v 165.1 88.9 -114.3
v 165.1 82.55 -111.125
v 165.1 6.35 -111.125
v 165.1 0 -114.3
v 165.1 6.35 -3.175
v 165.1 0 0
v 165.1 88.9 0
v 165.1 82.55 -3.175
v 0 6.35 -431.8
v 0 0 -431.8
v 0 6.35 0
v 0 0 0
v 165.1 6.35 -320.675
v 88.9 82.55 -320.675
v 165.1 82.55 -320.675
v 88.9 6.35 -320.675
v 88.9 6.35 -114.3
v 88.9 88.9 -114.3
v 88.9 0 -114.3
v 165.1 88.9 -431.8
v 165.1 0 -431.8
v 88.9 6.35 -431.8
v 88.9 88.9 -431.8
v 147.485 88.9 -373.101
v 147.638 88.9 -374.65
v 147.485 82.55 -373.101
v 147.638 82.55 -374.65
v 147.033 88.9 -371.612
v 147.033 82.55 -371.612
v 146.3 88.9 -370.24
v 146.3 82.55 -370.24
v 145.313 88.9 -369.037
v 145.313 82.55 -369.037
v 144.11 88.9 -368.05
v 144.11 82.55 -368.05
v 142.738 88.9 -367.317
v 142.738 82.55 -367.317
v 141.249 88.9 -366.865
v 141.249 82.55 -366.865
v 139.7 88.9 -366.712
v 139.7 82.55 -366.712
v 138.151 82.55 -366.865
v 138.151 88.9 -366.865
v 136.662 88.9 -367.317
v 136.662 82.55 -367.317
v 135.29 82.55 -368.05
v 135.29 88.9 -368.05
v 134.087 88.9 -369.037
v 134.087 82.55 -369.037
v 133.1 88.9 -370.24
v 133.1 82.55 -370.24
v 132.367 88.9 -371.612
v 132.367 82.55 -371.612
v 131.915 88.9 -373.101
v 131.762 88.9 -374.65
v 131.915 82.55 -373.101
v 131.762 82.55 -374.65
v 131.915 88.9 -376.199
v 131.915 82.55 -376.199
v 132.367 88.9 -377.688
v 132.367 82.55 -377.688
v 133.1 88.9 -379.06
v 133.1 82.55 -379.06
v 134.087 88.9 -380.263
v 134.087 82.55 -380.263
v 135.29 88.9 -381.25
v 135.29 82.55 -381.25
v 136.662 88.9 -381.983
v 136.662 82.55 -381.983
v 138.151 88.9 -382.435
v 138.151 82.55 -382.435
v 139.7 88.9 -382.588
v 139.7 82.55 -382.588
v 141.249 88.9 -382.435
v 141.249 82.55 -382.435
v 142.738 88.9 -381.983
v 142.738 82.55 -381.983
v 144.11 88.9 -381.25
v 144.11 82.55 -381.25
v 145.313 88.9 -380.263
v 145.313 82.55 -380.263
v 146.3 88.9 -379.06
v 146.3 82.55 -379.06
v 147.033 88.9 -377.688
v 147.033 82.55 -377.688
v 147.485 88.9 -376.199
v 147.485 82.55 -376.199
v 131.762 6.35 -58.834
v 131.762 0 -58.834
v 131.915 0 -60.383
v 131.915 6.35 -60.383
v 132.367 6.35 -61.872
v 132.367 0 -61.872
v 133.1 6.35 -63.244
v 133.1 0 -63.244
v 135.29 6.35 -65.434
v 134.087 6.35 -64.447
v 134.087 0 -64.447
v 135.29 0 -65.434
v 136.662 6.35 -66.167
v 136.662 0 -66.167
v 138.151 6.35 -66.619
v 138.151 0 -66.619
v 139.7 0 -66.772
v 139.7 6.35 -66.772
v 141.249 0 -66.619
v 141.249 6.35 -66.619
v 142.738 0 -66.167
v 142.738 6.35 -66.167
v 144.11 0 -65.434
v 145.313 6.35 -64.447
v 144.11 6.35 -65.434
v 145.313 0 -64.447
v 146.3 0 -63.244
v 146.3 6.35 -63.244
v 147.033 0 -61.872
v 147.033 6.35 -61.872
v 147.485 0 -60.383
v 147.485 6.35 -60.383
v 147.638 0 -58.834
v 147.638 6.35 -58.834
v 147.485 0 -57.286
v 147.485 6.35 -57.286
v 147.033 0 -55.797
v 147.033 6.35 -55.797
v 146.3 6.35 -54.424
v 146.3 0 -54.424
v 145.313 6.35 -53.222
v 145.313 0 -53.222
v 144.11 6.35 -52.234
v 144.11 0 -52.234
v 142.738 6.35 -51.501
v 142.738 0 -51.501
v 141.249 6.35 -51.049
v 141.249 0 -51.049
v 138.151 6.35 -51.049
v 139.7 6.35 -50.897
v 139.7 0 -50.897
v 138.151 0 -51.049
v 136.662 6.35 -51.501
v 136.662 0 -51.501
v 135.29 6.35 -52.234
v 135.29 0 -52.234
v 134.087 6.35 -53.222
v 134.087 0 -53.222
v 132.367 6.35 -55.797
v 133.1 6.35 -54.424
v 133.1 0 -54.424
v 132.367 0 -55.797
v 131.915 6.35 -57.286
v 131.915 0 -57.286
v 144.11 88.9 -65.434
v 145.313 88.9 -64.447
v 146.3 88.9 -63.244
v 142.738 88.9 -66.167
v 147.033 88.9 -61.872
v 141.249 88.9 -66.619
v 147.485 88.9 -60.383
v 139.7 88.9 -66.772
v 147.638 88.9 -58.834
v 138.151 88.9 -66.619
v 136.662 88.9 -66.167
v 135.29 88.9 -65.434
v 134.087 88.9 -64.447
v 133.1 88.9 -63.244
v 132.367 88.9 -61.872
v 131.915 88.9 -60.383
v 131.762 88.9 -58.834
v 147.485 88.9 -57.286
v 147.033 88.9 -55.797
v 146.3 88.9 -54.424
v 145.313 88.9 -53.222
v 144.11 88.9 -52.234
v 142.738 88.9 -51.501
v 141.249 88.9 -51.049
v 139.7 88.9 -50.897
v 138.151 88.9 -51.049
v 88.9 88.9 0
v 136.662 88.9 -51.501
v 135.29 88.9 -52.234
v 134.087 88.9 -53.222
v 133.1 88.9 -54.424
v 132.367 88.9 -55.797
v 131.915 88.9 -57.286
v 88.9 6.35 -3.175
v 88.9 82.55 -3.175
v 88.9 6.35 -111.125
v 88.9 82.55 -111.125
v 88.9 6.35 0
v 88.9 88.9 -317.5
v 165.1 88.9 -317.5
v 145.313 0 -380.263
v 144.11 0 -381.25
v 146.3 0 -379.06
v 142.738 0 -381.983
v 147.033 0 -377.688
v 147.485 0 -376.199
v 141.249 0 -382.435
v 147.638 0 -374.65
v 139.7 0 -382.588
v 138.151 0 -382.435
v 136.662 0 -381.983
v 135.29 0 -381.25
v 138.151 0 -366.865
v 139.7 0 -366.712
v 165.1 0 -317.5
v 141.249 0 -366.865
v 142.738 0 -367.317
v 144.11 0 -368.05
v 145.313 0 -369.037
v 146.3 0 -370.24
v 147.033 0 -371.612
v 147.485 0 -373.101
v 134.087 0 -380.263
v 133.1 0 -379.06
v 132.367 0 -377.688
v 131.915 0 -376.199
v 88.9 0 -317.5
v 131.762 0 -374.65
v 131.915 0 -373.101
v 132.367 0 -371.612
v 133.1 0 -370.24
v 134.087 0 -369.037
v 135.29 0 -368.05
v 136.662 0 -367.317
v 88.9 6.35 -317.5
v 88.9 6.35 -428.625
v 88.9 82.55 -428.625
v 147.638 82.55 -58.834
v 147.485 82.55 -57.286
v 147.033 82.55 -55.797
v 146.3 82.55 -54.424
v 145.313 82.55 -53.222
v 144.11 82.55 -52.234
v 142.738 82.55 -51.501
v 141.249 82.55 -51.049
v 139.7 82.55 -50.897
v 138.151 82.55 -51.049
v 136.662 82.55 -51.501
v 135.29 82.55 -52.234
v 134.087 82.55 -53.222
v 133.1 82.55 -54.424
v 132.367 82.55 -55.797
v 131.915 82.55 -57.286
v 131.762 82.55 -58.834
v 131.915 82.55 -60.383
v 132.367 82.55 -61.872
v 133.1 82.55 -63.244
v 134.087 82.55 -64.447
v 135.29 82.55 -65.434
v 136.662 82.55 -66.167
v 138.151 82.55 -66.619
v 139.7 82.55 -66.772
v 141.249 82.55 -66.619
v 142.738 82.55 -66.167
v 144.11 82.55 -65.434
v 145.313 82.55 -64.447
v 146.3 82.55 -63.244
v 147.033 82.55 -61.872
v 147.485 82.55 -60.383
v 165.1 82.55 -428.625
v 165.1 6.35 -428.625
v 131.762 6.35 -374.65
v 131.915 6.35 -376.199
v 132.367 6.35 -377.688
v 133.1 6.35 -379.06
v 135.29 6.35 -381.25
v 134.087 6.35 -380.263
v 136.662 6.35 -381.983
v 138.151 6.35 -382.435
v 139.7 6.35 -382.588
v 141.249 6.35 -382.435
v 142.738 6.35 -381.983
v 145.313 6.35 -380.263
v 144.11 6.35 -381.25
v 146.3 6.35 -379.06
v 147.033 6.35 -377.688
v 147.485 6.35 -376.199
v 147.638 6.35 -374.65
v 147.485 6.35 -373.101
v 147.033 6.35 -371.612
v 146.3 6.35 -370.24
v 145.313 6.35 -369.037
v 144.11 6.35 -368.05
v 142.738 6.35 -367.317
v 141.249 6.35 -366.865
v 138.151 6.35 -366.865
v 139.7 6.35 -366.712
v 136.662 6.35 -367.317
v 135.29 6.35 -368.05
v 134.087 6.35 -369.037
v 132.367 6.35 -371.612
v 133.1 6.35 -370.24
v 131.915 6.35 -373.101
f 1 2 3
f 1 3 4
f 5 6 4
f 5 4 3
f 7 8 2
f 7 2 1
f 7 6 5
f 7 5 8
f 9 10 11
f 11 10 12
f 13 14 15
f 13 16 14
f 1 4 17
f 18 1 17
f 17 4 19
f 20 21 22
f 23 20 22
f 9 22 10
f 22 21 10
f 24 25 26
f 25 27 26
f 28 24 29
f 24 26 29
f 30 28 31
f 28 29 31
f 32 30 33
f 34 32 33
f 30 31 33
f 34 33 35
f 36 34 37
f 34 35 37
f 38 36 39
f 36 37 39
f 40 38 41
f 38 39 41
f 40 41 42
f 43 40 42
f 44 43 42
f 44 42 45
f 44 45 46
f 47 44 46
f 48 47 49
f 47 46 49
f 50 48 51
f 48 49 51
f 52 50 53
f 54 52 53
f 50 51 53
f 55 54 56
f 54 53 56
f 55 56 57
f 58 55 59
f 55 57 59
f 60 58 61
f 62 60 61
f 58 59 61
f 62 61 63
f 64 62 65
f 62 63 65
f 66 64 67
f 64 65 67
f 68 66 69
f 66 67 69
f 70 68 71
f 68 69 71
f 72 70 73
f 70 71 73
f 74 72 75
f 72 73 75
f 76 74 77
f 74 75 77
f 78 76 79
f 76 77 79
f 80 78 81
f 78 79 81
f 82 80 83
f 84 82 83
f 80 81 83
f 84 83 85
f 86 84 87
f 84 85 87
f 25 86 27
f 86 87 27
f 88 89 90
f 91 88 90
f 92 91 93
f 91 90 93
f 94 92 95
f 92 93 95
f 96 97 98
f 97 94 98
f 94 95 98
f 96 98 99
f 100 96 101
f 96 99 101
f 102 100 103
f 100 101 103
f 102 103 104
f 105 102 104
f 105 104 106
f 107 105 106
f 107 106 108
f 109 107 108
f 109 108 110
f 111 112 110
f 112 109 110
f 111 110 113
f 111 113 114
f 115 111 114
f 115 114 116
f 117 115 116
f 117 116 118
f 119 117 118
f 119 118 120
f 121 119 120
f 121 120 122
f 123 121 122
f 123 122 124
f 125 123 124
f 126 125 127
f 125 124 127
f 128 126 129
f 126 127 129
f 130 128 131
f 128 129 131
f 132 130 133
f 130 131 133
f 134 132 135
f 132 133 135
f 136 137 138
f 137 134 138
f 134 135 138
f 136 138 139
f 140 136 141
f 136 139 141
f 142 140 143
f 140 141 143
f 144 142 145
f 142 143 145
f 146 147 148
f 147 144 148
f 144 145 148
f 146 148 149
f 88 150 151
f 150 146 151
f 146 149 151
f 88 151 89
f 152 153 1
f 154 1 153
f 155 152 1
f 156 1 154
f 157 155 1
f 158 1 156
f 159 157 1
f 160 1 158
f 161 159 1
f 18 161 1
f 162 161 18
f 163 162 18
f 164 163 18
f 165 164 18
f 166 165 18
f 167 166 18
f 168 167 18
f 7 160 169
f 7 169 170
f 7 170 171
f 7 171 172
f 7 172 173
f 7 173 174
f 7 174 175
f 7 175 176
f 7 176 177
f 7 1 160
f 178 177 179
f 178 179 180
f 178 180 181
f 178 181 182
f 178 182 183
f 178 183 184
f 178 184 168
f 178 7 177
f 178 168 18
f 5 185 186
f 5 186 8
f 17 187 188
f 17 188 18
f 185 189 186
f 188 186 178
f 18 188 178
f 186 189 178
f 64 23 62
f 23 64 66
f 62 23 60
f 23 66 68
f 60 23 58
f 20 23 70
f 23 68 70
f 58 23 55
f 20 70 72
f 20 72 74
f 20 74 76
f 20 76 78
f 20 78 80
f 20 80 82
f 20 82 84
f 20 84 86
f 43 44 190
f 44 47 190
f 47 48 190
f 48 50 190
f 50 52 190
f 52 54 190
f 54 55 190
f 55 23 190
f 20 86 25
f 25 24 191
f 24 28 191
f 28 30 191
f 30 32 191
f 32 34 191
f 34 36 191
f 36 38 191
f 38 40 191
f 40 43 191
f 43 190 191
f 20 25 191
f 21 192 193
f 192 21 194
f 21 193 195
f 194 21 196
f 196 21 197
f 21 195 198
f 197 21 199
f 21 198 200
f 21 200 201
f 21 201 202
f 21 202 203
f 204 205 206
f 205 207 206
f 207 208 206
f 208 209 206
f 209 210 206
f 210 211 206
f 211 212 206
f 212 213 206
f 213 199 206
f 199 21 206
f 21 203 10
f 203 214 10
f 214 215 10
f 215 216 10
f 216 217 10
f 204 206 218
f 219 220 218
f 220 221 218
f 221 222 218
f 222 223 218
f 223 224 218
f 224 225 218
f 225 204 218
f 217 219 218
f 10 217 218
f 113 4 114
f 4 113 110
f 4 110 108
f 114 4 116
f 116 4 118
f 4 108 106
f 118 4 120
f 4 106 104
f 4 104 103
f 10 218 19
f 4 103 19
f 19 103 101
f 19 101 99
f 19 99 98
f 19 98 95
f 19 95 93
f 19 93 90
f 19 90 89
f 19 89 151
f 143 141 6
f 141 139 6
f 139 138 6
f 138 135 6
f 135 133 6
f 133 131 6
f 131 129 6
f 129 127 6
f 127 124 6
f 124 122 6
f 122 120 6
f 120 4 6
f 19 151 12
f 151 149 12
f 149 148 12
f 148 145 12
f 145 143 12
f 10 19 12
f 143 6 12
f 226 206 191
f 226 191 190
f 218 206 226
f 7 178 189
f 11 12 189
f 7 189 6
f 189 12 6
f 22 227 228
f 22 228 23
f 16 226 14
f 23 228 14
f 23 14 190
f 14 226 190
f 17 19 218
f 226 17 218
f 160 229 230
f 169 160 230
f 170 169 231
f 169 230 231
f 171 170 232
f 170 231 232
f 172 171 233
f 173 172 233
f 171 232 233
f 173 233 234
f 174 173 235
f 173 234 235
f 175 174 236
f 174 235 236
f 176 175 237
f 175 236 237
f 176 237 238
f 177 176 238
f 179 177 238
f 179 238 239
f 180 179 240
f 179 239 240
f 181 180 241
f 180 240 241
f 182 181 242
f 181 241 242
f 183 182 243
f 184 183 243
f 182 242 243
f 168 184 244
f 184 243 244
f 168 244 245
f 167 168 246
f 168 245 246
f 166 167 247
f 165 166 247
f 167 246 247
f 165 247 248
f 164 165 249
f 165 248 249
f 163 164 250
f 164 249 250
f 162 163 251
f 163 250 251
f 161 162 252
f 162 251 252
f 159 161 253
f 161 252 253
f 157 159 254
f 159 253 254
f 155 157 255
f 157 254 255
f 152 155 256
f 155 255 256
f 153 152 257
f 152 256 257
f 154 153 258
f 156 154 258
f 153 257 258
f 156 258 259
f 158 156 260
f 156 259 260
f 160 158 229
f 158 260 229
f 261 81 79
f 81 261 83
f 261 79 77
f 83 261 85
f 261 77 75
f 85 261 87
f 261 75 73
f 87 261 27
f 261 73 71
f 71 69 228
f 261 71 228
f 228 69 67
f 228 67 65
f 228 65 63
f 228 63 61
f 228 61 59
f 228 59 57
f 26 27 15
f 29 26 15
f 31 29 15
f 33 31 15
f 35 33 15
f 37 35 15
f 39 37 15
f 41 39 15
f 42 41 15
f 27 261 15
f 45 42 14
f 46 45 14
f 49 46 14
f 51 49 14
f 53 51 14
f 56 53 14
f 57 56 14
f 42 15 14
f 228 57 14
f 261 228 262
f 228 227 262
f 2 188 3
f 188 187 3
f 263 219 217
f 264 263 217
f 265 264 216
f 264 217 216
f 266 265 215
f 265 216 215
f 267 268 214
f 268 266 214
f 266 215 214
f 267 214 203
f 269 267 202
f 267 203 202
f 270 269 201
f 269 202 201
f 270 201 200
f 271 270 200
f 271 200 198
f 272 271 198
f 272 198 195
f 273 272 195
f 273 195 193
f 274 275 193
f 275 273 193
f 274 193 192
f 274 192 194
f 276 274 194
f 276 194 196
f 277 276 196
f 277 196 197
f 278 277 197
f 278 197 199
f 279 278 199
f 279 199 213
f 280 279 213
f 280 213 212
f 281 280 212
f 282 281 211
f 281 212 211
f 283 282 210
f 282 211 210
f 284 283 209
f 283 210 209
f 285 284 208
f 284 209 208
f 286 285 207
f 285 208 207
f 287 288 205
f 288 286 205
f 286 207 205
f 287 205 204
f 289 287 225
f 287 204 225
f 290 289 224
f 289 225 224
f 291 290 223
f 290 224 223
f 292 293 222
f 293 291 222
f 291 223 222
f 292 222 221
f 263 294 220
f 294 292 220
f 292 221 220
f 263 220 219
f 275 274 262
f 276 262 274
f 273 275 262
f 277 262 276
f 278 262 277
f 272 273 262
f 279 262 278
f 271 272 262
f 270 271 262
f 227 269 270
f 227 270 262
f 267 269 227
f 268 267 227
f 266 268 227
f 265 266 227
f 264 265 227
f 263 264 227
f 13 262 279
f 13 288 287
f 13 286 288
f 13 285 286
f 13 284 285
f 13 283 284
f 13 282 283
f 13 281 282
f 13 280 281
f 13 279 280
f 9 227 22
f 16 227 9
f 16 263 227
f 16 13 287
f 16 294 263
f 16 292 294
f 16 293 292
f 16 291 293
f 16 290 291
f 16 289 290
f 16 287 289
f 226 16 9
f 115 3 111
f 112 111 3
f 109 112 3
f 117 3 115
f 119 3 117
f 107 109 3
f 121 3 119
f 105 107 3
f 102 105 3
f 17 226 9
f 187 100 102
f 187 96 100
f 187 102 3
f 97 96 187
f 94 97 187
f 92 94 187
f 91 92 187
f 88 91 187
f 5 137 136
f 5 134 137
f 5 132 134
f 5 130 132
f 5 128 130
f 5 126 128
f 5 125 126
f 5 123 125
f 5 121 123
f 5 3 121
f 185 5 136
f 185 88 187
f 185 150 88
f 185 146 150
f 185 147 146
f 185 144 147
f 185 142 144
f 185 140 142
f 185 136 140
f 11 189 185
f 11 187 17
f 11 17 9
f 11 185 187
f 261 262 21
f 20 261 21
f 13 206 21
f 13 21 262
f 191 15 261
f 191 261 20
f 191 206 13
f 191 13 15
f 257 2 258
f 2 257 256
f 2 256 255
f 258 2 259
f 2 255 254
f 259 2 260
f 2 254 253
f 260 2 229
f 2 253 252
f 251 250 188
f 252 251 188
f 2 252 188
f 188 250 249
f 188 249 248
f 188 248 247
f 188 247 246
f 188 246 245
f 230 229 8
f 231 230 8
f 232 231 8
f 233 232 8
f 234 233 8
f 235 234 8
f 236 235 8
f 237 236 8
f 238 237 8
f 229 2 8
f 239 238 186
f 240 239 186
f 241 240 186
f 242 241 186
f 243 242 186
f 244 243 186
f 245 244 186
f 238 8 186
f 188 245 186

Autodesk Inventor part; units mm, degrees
ref_plane "YZ Plane" through (0, 0, 0) normal (1, 0, 0) x (0, 1, 0)
ref_plane "XZ Plane" through (0, 0, 0) normal (0, 1, 0) x (-1, 0, 0)
ref_plane "XY Plane" through (0, 0, 0) normal (0, 0, 1) x (1, 0, 0)
sketch "Sketch1" plane through (0, 0, 0) normal (0, 1, 0) x (-1, 0, 0)
  line L0 (0, 0) -> (-88.9, 0)
  line L1 (-88.9, -114.3) -> (-88.9, -317.5)
  line L2 (-88.9, -431.8) -> (0, -431.8)
  line L3 (0, -431.8) -> (0, 0)
  line L4 (-88.9, 0) -> (-165.1, 0)
  line L5 (-165.1, 0) -> (-165.1, -114.3)
  line L6 (-165.1, -114.3) -> (-88.9, -114.3)
  line L7 (-88.9, -114.3) -> (-88.9, 0)
  line L8 (-88.9, -431.8) -> (-165.1, -431.8)
  line L9 (-165.1, -431.8) -> (-165.1, -317.5)
  line L10 (-165.1, -317.5) -> (-88.9, -317.5)
  line L11 (-88.9, -317.5) -> (-88.9, -431.8)
  line L12 (-88.9, -374.65) -> (-139.7, -374.65) construction
  line L13 (-88.9, -58.8342) -> (-139.7, -58.8342) construction
  circle A0 centre (-139.7, -58.8342) radius 7.9375
  circle A1 centre (-139.7, -374.65) radius 7.9375
  dimension "d0" = 88.9
  dimension "d1" = 431.8
  dimension "d2" = 76.2
  dimension "d3" = 114.3
  dimension "d4" = 76.2
  dimension "d5" = 114.3
  dimension "d6" = 50.8
  dimension "d7" = 15.875
  dimension "d8" = 15.875
extrude "Extrusion1" add sketch "Sketch1" along normal blind 6.35
sketch "Sketch8" plane through (0, 6.35, 0) normal (0, 1, 0) x (1, 0, 0)
  circle A0 centre (139.7, 58.8342) radius 7.9375 projected
  circle A1 centre (139.7, 374.65) radius 7.9375 projected
  line L0 (88.9, 317.5) -> (165.1, 317.5) projected
  line L1 (165.1, 317.5) -> (165.1, 431.8) projected
  line L2 (165.1, 431.8) -> (0, 431.8) projected
  line L3 (0, 431.8) -> (0, 0) projected
  line L4 (0, 0) -> (165.1, 0) projected
  line L5 (165.1, 0) -> (165.1, 114.3) projected
  line L6 (165.1, 114.3) -> (88.9, 114.3) projected
  line L7 (88.9, 114.3) -> (88.9, 317.5) projected
  line L8 (165.1, 0) -> (88.9, 0)
  line L9 (88.9, 0) -> (88.9, 3.175)
  line L10 (88.9, 3.175) -> (165.1, 3.175)
  line L11 (165.1, 3.175) -> (165.1, 0)
  line L12 (165.1, 114.3) -> (88.9, 114.3)
  line L13 (88.9, 114.3) -> (88.9, 111.125)
  line L14 (88.9, 111.125) -> (165.1, 111.125)
  line L15 (165.1, 111.125) -> (165.1, 114.3)
  line L16 (88.9, 114.3) -> (88.9, 317.5) projected
  line L17 (165.1, 317.5) -> (88.9, 317.5)
  line L18 (88.9, 317.5) -> (88.9, 320.675)
  line L19 (88.9, 320.675) -> (165.1, 320.675)
  line L20 (165.1, 320.675) -> (165.1, 317.5)
  line L21 (165.1, 431.8) -> (88.9, 431.8)
  line L22 (88.9, 431.8) -> (88.9, 428.625)
  line L23 (88.9, 428.625) -> (165.1, 428.625)
  line L24 (165.1, 428.625) -> (165.1, 431.8)
  dimension "d27" = 3.175
  dimension "d28" = 3.175
  dimension "d29" = 3.175
  dimension "d30" = 3.175
extrude "Extrusion7" add sketch "Sketch8" along normal blind 82.55 contours L18 L19 L1 L0 | L6 L5 L14 L13 | L23 L22 L2 L1 | L5 L4 L9 L10
sketch "Sketch9" plane through (165.1, 6.35, -3.175) normal (0, 0, -1) x (-1, 0, 0)
  line L0 (76.2, 0) -> (0, 0) projected
  line L1 (76.2, 0) -> (76.2, 82.55) projected
  line L2 (0, 82.55) -> (76.2, 82.55) projected
  line L3 (0, 0) -> (0, 82.55) projected
  line L4 (0, -6.35) -> (0, 82.55) projected
  line L5 (76.2, 82.55) -> (0, 82.55)
  line L6 (0, 82.55) -> (0, 76.2)
  line L7 (0, 76.2) -> (76.2, 76.2)
  line L8 (76.2, 76.2) -> (76.2, 82.55)
  point P0 (165.1, -6.35)
  dimension "d33" = 6.35
sketch "Sketch10" plane through (165.1, 6.35, -320.675) normal (0, 0, -1) x (-1, 0, 0)
  line L0 (76.2, -6.35) -> (0, -6.35) projected
  line L1 (0, -6.35) -> (0, 82.55) projected
  line L2 (76.2, 82.55) -> (0, 82.55) projected
  line L3 (76.2, 0) -> (76.2, 82.55) projected
  line L4 (76.2, -6.35) -> (76.2, 0) projected
  line L5 (0, 0) -> (0, 82.55) projected
  line L6 (76.2, 82.55) -> (0, 82.55)
  line L7 (0, 82.55) -> (0, 76.2)
  line L8 (0, 76.2) -> (76.2, 76.2)
  line L9 (76.2, 76.2) -> (76.2, 82.55)
  point P0 (165.1, -6.35)
  dimension "d34" = 6.35
extrude "Extrusion8" add sketch "Sketch9" along normal blind 107.95 contours L7 L3 L2 L1
extrude "Extrusion9" add sketch "Sketch10" along normal blind 107.95 contours L8 L1 L2 L3
sketch "Sketch11" plane through (88.9, 82.55, -320.675) normal (0, -1, 0) x (1, 0, 0)
  line L0 (0, 0) -> (76.2, 0) projected
  circle A0 centre (50.8, -53.975) radius 7.9375 projected
  line L1 (0, 206.375) -> (0, 3.175) projected
  line L2 (76.2, -111.125) -> (-88.9, -111.125) projected
  line L3 (76.2, 3.175) -> (76.2, -111.125) projected
  line L4 (0, 3.175) -> (76.2, 3.175) projected
  circle A1 centre (50.8, 261.8408) radius 7.9375 projected
  line L5 (0, 206.375) -> (0, 3.175) projected
  line L6 (76.2, 206.375) -> (0, 206.375) projected
  line L7 (76.2, 320.675) -> (76.2, 206.375) projected
  line L8 (-88.9, 320.675) -> (76.2, 320.675) projected
  line L9 (-88.9, -111.125) -> (-88.9, 320.675) projected
  line L10 (76.2, -111.125) -> (-88.9, -111.125) projected
  circle A2 centre (50.8, 261.8408) radius 7.9375 projected
  circle A3 centre (50.8, -53.975) radius 7.9375
  circle A4 centre (50.8, 261.8408) radius 7.9375
  line L11 (76.2, 3.175) -> (76.2, -111.125) projected
  line L12 (0, 3.175) -> (76.2, 3.175) projected
  line L13 (76.2, 206.375) -> (0, 206.375) projected
  line L14 (76.2, 320.675) -> (76.2, 206.375) projected
  line L15 (-88.9, 320.675) -> (76.2, 320.675) projected
  line L16 (-88.9, -111.125) -> (-88.9, 320.675) projected
extrude "Extrusion10" cut sketch "Sketch11" against normal blind 25.4 contours A0
sketch "Sketch12" plane through (88.9, 82.55, -3.175) normal (0, -1, 0) x (1, 0, 0)
  circle A0 centre (50.8, -55.6592) radius 7.9375 projected
  circle A1 centre (50.8, -55.6592) radius 7.9375
  point P0 (-88.9, 3.175)
extrude "Extrusion11" cut sketch "Sketch12" against normal blind 25.4
properties part number "side"
